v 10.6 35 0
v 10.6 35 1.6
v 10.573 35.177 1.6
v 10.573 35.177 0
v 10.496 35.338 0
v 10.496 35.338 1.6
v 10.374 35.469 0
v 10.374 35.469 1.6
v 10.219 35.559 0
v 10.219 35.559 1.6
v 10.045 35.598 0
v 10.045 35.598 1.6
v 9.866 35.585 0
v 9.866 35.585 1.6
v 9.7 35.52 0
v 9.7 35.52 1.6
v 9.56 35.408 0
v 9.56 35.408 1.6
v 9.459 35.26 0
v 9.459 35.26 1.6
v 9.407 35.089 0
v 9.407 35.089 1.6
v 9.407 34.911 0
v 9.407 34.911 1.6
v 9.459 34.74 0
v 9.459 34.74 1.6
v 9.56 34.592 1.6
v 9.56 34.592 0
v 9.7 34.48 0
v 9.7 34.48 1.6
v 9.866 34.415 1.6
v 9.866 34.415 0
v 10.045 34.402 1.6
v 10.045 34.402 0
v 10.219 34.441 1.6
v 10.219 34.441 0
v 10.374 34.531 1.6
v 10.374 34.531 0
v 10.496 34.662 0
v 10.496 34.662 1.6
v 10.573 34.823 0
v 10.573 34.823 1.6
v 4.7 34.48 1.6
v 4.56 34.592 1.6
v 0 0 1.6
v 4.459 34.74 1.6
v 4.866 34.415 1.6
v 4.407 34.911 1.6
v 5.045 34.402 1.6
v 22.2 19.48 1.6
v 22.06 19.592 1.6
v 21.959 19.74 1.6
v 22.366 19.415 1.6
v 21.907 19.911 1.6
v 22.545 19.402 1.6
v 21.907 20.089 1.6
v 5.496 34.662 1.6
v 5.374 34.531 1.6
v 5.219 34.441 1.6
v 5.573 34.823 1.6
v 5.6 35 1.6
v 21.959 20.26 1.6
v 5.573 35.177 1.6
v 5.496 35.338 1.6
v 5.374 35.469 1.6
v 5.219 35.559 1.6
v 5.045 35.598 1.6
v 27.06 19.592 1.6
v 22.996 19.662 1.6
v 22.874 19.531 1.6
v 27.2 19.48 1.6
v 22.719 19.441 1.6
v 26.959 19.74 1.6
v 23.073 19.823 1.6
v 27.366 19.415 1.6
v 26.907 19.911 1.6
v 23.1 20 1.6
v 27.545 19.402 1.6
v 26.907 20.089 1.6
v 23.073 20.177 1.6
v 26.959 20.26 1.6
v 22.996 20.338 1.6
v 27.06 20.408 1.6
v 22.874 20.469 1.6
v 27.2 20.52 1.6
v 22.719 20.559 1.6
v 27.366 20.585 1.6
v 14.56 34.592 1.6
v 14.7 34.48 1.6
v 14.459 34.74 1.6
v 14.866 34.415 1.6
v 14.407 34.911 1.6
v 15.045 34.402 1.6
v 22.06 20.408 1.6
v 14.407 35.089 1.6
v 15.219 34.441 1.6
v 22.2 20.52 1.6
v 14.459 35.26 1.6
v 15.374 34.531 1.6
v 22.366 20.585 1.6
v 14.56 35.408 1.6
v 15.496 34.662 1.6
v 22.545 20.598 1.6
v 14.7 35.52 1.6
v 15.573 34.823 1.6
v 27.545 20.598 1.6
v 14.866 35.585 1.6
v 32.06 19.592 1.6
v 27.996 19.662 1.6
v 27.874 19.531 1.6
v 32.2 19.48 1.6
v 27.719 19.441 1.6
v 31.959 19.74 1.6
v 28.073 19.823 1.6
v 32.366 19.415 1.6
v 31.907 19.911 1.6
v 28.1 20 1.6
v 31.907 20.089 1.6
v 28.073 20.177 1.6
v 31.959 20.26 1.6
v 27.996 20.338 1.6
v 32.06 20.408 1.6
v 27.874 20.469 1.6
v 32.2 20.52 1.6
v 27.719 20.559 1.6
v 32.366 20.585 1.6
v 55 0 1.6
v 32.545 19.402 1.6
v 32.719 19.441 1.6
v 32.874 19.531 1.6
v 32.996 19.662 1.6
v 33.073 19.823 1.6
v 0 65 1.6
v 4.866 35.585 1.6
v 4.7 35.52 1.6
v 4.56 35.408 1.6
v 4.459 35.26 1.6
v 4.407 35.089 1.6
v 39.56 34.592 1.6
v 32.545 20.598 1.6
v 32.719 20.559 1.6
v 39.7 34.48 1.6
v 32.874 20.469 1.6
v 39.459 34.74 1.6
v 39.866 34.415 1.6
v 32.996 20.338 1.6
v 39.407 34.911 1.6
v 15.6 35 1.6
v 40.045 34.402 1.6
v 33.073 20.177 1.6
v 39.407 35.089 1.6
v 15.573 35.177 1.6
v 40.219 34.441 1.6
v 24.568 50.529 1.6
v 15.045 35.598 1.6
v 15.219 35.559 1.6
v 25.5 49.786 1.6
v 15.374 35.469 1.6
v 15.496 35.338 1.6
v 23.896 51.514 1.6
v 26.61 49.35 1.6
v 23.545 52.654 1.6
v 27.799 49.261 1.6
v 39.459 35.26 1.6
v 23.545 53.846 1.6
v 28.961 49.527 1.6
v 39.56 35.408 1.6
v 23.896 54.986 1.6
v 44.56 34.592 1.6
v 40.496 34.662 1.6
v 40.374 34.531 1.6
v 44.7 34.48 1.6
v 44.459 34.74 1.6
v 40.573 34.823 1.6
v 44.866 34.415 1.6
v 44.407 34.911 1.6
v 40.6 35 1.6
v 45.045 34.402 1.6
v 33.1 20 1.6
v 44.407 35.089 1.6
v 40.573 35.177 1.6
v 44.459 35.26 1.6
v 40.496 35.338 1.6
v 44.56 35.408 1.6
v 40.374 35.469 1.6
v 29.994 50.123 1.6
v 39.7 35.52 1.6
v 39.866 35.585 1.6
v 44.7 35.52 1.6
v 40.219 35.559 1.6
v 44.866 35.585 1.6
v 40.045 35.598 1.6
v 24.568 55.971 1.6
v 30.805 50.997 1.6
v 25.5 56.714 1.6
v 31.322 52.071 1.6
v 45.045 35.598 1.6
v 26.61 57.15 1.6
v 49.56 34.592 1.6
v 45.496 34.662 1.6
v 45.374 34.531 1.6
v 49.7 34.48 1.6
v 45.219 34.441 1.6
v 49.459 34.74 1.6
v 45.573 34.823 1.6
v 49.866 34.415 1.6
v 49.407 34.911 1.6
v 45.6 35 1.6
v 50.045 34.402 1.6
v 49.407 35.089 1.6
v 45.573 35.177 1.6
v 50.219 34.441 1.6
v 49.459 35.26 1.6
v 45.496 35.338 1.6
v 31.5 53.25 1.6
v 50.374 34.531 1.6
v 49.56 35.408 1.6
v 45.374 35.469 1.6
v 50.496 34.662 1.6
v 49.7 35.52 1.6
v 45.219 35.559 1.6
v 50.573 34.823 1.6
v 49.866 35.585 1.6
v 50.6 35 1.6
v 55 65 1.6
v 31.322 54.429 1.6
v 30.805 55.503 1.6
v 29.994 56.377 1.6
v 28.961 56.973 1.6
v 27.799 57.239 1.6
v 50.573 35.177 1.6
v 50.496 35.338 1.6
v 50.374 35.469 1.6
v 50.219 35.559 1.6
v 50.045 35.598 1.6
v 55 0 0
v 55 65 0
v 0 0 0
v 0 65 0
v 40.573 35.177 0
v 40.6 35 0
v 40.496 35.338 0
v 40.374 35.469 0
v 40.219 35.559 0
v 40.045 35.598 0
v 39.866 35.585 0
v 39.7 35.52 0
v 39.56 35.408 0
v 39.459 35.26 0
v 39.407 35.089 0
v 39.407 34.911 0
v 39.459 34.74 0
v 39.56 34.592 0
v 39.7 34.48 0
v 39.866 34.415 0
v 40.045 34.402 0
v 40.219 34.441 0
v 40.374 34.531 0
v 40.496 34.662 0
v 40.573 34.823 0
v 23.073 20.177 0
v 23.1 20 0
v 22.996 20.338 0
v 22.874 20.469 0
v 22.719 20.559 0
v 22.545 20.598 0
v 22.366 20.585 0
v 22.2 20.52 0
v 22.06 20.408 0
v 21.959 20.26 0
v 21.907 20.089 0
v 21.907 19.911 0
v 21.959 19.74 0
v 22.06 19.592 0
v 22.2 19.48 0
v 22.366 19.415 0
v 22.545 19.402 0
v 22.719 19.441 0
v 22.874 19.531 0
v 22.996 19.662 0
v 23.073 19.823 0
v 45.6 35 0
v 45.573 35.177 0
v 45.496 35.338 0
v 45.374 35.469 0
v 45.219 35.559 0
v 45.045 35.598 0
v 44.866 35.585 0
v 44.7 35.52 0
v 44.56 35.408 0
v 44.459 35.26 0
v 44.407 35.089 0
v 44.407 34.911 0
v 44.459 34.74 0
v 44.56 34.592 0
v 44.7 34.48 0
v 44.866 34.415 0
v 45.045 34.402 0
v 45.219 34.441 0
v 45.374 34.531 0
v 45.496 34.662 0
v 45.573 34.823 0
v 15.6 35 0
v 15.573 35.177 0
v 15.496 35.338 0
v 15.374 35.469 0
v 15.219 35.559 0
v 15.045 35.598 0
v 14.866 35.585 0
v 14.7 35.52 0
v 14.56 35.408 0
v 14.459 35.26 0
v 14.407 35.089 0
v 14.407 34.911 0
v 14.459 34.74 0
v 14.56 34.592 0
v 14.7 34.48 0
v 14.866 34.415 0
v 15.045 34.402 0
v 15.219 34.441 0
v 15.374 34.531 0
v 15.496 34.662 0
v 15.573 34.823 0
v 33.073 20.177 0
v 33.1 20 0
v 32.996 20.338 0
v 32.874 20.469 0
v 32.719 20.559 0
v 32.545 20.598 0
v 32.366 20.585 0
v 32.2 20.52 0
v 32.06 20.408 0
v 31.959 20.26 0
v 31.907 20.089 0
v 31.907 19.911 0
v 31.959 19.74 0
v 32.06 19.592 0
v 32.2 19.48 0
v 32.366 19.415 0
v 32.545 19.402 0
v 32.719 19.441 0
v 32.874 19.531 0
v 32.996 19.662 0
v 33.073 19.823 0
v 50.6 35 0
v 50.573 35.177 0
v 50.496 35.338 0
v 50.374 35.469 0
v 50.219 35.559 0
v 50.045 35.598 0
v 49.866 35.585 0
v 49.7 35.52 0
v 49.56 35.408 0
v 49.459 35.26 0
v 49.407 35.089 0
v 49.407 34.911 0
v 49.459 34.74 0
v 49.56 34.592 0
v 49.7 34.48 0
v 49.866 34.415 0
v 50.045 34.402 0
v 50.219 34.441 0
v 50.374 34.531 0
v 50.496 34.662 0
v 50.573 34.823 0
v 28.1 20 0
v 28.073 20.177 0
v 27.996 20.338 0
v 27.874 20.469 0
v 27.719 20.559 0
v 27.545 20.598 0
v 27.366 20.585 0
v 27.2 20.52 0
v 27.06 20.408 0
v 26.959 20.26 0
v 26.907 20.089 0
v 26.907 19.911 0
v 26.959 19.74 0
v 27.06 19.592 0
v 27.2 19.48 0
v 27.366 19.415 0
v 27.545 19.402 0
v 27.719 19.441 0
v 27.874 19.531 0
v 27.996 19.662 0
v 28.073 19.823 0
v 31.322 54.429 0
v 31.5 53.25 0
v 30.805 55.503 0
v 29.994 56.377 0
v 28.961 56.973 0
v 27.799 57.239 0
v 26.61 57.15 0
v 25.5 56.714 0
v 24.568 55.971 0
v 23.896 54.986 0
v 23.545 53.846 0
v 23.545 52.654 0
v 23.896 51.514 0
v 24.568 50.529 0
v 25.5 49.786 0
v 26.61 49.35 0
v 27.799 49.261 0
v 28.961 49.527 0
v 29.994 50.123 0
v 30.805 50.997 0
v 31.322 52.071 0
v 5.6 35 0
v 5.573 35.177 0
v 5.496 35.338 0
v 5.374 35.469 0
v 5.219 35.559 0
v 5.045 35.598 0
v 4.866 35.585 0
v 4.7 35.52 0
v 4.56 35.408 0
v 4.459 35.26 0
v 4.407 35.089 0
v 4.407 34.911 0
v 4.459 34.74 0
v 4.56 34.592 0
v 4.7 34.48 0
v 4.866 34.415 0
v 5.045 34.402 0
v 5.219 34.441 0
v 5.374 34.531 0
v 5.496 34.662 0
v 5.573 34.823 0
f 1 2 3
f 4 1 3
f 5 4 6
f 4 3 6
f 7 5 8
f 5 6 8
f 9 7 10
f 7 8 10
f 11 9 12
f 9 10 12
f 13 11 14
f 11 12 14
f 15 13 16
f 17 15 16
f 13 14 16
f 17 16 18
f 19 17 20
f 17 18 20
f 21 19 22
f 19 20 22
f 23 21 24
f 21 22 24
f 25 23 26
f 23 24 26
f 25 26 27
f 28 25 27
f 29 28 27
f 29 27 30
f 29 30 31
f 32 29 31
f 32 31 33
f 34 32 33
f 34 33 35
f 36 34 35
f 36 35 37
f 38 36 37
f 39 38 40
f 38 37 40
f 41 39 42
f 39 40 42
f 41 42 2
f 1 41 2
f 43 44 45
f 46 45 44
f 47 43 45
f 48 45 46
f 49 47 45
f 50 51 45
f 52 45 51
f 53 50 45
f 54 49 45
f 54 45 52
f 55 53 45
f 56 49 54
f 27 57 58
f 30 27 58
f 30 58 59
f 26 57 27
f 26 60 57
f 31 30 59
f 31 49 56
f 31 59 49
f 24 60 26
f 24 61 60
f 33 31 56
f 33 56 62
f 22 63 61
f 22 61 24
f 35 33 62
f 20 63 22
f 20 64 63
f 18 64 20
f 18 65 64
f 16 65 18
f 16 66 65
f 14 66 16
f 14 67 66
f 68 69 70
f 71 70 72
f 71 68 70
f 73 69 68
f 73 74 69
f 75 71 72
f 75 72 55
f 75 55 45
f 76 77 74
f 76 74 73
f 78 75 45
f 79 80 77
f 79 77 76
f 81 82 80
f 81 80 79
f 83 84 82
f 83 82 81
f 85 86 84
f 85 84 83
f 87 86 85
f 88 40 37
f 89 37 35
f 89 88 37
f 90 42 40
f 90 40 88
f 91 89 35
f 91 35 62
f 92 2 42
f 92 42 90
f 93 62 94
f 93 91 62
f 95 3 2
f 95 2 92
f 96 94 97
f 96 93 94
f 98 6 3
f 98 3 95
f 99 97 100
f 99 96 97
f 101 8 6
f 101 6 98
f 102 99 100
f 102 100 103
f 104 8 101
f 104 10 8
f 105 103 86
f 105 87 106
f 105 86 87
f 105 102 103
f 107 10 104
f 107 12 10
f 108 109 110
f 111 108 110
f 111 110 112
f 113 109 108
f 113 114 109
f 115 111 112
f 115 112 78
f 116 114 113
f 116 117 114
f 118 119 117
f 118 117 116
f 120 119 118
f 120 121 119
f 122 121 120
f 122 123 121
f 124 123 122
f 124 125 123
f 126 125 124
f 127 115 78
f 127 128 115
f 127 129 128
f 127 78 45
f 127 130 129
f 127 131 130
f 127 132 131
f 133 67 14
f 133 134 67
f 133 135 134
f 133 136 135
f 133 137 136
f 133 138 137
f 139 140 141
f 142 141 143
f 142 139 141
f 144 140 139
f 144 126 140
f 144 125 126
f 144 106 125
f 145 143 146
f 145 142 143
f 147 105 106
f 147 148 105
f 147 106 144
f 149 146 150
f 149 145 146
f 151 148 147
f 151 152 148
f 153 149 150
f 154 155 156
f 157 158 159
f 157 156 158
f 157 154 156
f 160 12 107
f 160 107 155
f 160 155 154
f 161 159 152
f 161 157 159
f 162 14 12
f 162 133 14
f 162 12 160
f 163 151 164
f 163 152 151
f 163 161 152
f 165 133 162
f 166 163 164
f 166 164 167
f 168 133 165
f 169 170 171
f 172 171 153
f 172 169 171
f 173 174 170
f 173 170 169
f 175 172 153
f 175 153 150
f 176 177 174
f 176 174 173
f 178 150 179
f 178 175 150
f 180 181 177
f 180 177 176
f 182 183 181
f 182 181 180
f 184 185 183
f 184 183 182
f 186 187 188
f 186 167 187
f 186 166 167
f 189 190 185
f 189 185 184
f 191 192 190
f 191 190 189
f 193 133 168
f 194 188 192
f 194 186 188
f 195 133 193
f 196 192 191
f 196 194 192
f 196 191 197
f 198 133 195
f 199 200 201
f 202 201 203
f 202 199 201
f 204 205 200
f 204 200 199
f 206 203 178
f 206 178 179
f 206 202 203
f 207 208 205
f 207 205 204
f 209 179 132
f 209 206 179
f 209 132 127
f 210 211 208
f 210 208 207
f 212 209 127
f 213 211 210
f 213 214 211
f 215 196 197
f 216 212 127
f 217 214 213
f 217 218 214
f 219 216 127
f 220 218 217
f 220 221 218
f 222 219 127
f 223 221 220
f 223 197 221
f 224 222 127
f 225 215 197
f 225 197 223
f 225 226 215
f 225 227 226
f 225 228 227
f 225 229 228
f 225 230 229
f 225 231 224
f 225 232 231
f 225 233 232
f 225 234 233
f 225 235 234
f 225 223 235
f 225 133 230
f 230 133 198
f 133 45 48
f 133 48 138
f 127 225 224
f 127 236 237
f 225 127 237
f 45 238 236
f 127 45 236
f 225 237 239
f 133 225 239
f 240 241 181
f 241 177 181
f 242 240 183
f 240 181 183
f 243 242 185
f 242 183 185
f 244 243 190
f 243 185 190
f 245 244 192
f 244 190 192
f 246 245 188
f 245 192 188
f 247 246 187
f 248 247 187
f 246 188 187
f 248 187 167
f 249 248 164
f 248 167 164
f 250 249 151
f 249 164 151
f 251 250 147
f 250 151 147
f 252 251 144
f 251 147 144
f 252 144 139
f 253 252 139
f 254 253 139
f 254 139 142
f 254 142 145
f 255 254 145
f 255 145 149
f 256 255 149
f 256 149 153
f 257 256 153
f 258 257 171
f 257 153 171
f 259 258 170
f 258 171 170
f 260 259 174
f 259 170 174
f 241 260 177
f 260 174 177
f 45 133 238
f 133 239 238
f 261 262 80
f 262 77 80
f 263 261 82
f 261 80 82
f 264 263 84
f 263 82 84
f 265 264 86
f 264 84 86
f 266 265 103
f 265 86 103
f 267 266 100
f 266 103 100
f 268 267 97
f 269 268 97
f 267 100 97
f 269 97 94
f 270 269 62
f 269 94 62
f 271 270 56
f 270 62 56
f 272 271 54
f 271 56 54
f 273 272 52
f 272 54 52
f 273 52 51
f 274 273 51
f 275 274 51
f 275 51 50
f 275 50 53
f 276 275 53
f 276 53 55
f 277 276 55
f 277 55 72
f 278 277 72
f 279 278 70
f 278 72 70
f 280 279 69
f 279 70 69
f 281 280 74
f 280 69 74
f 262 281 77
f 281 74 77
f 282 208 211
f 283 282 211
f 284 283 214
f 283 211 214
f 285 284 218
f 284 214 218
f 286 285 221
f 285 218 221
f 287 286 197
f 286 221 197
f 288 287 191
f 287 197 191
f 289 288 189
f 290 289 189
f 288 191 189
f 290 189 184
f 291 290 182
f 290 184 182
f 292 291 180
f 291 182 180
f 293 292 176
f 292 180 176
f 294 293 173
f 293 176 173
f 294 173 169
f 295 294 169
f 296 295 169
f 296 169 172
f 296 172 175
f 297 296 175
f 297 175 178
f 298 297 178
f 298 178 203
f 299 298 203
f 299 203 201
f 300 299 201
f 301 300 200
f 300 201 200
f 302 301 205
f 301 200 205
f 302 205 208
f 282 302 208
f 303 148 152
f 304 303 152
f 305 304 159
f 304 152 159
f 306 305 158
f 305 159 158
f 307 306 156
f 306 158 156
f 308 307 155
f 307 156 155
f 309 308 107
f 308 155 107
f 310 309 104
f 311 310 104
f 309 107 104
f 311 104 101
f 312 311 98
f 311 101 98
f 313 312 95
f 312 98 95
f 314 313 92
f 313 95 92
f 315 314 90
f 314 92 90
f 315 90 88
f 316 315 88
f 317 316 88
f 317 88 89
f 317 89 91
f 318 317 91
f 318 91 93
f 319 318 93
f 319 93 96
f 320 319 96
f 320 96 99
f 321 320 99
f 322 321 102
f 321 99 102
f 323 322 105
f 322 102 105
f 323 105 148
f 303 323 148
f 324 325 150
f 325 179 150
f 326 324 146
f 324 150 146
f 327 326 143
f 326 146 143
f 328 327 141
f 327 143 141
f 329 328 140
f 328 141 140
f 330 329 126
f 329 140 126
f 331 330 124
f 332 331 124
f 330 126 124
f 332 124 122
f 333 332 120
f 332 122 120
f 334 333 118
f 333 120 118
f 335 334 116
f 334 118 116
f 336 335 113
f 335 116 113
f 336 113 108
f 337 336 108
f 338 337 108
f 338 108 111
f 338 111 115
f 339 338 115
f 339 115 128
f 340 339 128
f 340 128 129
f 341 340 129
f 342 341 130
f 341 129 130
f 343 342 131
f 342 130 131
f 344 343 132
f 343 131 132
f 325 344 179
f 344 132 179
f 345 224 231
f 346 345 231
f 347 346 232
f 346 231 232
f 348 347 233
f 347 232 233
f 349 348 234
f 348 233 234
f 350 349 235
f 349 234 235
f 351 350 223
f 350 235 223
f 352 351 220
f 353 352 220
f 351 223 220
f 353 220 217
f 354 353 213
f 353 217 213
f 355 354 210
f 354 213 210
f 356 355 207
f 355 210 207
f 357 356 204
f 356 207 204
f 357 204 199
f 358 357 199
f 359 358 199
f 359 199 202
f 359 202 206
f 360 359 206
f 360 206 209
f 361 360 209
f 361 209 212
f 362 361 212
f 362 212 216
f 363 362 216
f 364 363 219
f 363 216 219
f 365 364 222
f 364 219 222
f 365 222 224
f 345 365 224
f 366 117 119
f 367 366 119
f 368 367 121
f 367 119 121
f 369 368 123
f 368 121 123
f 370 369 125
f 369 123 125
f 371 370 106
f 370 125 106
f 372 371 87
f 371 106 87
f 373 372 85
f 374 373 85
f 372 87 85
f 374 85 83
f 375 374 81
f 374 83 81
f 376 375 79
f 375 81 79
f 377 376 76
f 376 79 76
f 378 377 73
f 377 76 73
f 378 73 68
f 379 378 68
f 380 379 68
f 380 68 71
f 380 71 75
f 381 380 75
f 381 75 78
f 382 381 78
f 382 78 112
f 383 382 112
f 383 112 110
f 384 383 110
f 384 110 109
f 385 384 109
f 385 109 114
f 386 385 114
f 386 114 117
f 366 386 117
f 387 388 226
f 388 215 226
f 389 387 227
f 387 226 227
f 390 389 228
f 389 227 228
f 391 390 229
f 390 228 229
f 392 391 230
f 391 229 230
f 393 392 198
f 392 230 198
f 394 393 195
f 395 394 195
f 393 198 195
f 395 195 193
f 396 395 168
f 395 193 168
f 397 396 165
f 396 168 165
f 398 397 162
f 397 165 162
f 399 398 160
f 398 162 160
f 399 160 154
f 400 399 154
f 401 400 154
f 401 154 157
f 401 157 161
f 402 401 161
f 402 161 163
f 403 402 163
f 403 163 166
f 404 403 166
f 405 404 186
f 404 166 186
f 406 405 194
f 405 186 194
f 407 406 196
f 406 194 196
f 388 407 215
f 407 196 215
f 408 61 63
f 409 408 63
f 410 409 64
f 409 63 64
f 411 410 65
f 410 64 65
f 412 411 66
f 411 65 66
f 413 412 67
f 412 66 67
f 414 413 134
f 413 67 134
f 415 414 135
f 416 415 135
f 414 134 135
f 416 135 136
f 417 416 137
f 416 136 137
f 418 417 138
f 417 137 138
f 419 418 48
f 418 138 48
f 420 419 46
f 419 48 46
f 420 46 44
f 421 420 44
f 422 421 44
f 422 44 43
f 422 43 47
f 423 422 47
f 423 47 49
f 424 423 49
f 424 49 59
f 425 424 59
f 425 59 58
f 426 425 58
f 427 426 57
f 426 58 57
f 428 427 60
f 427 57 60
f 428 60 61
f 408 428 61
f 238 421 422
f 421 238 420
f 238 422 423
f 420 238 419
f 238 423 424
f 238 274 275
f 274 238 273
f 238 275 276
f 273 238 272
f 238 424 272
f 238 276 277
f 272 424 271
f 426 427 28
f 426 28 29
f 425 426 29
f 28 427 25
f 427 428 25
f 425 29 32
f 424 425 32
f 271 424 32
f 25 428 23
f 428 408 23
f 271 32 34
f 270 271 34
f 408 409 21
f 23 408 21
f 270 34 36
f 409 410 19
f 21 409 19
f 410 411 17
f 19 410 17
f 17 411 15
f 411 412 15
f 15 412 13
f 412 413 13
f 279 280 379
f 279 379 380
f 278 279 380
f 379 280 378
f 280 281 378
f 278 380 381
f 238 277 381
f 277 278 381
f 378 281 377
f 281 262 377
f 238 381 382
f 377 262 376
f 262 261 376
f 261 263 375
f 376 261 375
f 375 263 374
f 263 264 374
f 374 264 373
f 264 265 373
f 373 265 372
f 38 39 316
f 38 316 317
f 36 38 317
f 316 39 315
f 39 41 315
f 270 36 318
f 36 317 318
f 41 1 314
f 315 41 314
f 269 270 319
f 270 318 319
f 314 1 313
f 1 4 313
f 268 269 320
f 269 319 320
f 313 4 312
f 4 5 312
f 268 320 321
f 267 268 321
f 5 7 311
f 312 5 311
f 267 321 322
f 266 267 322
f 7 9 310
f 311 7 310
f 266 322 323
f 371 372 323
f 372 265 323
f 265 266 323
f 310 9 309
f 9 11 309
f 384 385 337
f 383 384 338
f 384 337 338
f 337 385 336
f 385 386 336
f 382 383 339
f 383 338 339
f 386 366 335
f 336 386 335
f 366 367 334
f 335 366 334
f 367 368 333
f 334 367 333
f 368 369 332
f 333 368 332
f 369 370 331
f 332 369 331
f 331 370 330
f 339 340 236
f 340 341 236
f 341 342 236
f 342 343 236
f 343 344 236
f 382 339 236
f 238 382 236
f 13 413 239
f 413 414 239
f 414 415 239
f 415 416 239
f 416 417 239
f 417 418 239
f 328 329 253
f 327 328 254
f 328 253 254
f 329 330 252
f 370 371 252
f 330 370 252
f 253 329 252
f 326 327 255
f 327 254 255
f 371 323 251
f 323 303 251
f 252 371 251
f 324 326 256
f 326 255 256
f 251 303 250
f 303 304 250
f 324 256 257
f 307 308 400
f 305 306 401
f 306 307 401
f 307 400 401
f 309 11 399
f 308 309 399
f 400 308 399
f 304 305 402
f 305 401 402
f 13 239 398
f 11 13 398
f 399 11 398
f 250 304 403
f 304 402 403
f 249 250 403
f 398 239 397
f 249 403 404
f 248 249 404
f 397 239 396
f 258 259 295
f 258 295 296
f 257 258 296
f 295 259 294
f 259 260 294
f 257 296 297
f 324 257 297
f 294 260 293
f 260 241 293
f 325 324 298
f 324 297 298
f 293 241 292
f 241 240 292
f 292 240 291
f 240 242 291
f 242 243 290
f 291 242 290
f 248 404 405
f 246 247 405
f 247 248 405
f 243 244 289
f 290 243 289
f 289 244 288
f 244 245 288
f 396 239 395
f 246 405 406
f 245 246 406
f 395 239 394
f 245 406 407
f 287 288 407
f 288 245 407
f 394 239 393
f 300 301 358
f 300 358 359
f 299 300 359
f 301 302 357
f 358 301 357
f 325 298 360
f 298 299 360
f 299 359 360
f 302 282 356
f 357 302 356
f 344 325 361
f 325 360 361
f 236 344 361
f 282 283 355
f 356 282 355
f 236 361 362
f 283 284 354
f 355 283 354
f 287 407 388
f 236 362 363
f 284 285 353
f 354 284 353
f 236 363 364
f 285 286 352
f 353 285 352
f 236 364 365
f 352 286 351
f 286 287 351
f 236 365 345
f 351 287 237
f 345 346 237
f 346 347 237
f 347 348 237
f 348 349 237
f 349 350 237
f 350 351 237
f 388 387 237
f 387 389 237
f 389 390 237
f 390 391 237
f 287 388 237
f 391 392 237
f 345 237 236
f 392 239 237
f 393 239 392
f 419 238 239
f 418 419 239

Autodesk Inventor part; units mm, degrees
ref_plane "YZ Plane" through (0, 0, 0) normal (1, 0, 0) x (0, 1, 0)
ref_plane "XZ Plane" through (0, 0, 0) normal (0, 1, 0) x (-1, 0, 0)
ref_plane "XY Plane" through (0, 0, 0) normal (0, 0, 1) x (1, 0, 0)
sketch "Szkic1" plane through (0, 0, 0) normal (0, 0, 1) x (1, 0, 0)
  line L0 (0, 0) -> (55, 0)
  line L1 (55, 0) -> (55, 65)
  line L2 (55, 65) -> (0, 65)
  line L3 (0, 65) -> (0, 0)
  dimension "d0" = 55
  dimension "d1" = 65
extrude "Wyciągnięcie proste1" add sketch "Szkic1" along normal blind 1.6
sketch "Szkic2" plane through (0, 0, 1.6) normal (0, 0, 1) x (1, 0, 0)
  circle A0 centre (50, 35) radius 0.6
  circle A1 centre (45, 35) radius 0.6
  circle A2 centre (40, 35) radius 0.6
  circle A3 centre (32.5, 20) radius 0.6
  circle A4 centre (27.5, 20) radius 0.6
  circle A5 centre (22.5, 20) radius 0.6
  circle A6 centre (15, 35) radius 0.6
  circle A7 centre (10, 35) radius 0.6
  circle A8 centre (5, 35) radius 0.6
  line L0 (55, 65) -> (0, 65) projected
  point P0 (0, 0)
  point P1 (27.5, 65)
  dimension "d4" = 15
  dimension "d5" = 5
  dimension "d6" = 5
  dimension "d7" = 5
  dimension "d8" = 5
  dimension "d9" = 5
  dimension "d10" = 5
  dimension "d11" = 30
  dimension "d12" = 17.5
  dimension "d13" = 17.5
  dimension "d14" = 1.2
extrude "Wyciągnięcie proste2" cut sketch "Szkic2" against normal blind 1.6
sketch "Szkic3" plane through (0, 0, 1.6) normal (0, 0, 1) x (1, 0, 0)
  circle A0 centre (27.5, 53.25) radius 4 projected
  point P0 (0, 0)
extrude "Wyciągnięcie proste3" cut sketch "Szkic3" against normal blind 1.6
equation "\"d6\" = d5"
equation "\"d7\" = d6"
equation "\"d8\" = d7"
equation "\"d9\" = d8"
equation "\"d10\" = d9"
equation "\"d13\" = d12"
properties part number "pcb main"
